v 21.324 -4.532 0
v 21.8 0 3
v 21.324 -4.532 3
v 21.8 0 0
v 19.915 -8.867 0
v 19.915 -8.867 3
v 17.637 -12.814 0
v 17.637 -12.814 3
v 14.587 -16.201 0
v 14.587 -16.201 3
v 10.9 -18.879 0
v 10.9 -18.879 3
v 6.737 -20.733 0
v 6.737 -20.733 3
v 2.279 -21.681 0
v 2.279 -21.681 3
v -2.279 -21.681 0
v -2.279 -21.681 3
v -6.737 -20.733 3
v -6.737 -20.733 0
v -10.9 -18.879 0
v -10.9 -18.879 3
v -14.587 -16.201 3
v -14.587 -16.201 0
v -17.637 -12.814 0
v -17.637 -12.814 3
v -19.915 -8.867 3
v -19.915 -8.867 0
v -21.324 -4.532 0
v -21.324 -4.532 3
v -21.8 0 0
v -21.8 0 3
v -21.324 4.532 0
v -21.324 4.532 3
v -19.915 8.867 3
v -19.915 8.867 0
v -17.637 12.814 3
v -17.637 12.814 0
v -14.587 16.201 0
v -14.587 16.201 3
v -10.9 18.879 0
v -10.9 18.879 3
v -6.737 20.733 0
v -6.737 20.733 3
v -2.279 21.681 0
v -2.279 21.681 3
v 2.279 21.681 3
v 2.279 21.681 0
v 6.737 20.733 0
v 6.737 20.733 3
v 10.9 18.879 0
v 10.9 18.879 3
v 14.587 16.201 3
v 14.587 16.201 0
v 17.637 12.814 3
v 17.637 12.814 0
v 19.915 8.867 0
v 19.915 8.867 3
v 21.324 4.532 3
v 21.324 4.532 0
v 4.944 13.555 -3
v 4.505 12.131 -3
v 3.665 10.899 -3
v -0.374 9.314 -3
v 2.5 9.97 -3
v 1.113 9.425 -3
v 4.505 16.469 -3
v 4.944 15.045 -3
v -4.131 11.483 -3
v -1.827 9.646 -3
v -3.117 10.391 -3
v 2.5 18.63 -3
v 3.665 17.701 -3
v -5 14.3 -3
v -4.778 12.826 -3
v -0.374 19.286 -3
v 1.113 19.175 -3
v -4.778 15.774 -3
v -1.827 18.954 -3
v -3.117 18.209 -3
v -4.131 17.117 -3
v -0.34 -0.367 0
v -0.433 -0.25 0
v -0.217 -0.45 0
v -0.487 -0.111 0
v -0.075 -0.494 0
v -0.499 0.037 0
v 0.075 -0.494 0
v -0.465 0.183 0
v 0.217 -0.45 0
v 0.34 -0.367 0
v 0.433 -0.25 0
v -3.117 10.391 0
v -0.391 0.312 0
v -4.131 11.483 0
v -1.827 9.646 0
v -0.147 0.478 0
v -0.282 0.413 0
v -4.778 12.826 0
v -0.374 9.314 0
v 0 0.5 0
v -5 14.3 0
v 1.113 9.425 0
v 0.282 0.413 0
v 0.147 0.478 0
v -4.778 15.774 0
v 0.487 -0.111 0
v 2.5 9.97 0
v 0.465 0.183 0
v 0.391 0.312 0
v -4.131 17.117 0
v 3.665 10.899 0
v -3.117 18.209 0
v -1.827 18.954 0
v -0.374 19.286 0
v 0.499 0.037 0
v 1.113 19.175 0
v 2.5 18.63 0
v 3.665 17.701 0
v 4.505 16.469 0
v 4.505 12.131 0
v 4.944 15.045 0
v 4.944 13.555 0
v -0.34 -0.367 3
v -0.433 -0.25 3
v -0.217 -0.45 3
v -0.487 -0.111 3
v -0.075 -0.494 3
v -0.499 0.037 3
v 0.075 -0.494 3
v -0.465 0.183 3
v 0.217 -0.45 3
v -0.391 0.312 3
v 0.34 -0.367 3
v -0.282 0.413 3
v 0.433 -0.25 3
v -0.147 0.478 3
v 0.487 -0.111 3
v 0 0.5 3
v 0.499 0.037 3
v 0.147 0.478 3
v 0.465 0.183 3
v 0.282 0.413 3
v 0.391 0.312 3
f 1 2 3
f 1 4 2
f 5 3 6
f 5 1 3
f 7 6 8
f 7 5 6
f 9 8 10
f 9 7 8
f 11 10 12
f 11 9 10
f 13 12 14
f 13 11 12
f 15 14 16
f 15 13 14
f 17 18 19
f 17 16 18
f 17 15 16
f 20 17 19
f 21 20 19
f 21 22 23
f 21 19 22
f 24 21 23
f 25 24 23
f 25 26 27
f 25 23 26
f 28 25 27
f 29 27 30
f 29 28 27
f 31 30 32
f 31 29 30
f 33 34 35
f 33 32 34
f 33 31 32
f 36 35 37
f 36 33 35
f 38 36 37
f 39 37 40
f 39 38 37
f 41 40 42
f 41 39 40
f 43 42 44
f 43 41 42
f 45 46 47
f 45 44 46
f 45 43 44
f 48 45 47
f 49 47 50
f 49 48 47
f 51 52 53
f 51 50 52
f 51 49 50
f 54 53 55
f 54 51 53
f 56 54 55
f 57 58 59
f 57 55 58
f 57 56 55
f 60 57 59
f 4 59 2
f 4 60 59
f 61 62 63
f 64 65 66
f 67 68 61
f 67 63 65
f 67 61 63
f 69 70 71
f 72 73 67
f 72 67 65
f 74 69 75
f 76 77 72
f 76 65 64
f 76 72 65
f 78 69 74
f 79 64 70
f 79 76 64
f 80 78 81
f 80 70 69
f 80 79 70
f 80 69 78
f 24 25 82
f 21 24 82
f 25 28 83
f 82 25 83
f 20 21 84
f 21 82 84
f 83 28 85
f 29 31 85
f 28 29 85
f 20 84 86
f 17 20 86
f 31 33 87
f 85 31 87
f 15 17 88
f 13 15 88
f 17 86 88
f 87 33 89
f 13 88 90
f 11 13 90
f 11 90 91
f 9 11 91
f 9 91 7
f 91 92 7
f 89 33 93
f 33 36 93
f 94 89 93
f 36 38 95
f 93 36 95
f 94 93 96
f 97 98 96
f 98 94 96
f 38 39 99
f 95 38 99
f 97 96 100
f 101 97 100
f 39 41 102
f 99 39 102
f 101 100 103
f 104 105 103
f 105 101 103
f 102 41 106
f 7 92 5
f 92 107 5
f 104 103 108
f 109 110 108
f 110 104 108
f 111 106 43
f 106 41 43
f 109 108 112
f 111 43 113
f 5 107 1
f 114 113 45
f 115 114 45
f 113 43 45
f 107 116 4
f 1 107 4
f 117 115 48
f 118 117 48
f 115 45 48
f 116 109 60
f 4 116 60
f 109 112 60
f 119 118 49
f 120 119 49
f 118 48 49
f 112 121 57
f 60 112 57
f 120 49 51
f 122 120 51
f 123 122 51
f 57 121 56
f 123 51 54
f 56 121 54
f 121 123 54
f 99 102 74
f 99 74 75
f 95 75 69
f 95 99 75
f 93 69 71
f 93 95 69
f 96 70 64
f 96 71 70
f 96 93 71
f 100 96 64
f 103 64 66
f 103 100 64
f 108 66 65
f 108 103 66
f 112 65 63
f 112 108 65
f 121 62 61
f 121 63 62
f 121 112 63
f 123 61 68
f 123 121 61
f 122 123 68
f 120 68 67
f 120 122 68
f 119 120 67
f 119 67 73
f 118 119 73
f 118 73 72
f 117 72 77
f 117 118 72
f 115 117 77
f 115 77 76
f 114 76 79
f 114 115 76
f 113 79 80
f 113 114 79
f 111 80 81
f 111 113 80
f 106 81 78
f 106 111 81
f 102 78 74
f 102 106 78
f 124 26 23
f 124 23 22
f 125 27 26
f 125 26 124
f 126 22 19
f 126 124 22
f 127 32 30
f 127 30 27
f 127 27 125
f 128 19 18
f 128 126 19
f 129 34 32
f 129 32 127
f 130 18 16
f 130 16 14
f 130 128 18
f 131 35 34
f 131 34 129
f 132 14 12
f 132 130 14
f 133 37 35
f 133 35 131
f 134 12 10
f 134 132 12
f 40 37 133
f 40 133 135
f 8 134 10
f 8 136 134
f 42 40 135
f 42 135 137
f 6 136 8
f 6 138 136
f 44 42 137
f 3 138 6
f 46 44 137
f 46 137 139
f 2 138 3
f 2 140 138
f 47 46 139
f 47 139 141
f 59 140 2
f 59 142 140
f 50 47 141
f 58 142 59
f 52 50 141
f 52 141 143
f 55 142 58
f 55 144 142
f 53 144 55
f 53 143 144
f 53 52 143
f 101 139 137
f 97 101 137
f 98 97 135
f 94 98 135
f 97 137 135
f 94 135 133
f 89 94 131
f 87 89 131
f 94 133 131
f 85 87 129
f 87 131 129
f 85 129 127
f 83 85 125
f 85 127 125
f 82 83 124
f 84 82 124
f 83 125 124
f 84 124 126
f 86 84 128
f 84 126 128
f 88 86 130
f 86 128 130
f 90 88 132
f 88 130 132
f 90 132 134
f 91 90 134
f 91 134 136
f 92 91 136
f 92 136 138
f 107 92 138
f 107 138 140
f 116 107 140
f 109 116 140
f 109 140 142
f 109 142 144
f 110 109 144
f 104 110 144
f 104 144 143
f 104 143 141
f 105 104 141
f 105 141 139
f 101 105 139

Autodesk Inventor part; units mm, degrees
ref_plane "YZ Plane" through (0, 0, 0) normal (1, 0, 0) x (0, 1, 0)
ref_plane "XZ Plane" through (0, 0, 0) normal (0, 1, 0) x (-1, 0, 0)
ref_plane "XY Plane" through (0, 0, 0) normal (0, 0, 1) x (1, 0, 0)
sketch "Sketch1" plane through (0, 0, 0) normal (0, 0, 1) x (1, 0, 0)
  circle A0 centre (0, 0) radius 21.8
  dimension "d0" = 43.6
extrude "Cuerpo" add sketch "Sketch1" along normal blind 3
sketch "Sketch2" plane through (0, 0, 0) normal (0, 0, -1) x (-1, 0, 0)
  circle A0 centre (0, 14.3) radius 5
  point P0 (0, 0)
  dimension "d4" = 14.3
  dimension "d5" = 10
extrude "Manivela" add sketch "Sketch2" along normal blind 3
sketch "Sketch3" plane through (0, 0, 0) normal (0, 0, -1) x (-1, 0, 0)
  circle A0 centre (0, 0) radius 21.8 projected
hole "Centro" at (0, 0, 0) direction (0, 0, 1) diameter 1 end through all
equation "\"d0\" = ri_diametro"
equation "\"d1\" = ri_grosor"
equation "\"d4\" = ri_eje_separacion"
equation "\"d5\" = ri_eje_diametro"
equation "\"d6\" = ri_eje_grosor"
equation "\"d8\" = ri_ancla_diametro"
equation "\"ri_diametro\" = 43.6"
equation "\"ri_grosor\" = 3"
equation "\"ri_eje_diametro\" = 10"
equation "\"ri_eje_grosor\" = 3"
equation "\"ri_ancla_diametro\" = 1"
equation "\"ri_eje_separacion\" = 14.3"
properties part number "Rueda Interna"
